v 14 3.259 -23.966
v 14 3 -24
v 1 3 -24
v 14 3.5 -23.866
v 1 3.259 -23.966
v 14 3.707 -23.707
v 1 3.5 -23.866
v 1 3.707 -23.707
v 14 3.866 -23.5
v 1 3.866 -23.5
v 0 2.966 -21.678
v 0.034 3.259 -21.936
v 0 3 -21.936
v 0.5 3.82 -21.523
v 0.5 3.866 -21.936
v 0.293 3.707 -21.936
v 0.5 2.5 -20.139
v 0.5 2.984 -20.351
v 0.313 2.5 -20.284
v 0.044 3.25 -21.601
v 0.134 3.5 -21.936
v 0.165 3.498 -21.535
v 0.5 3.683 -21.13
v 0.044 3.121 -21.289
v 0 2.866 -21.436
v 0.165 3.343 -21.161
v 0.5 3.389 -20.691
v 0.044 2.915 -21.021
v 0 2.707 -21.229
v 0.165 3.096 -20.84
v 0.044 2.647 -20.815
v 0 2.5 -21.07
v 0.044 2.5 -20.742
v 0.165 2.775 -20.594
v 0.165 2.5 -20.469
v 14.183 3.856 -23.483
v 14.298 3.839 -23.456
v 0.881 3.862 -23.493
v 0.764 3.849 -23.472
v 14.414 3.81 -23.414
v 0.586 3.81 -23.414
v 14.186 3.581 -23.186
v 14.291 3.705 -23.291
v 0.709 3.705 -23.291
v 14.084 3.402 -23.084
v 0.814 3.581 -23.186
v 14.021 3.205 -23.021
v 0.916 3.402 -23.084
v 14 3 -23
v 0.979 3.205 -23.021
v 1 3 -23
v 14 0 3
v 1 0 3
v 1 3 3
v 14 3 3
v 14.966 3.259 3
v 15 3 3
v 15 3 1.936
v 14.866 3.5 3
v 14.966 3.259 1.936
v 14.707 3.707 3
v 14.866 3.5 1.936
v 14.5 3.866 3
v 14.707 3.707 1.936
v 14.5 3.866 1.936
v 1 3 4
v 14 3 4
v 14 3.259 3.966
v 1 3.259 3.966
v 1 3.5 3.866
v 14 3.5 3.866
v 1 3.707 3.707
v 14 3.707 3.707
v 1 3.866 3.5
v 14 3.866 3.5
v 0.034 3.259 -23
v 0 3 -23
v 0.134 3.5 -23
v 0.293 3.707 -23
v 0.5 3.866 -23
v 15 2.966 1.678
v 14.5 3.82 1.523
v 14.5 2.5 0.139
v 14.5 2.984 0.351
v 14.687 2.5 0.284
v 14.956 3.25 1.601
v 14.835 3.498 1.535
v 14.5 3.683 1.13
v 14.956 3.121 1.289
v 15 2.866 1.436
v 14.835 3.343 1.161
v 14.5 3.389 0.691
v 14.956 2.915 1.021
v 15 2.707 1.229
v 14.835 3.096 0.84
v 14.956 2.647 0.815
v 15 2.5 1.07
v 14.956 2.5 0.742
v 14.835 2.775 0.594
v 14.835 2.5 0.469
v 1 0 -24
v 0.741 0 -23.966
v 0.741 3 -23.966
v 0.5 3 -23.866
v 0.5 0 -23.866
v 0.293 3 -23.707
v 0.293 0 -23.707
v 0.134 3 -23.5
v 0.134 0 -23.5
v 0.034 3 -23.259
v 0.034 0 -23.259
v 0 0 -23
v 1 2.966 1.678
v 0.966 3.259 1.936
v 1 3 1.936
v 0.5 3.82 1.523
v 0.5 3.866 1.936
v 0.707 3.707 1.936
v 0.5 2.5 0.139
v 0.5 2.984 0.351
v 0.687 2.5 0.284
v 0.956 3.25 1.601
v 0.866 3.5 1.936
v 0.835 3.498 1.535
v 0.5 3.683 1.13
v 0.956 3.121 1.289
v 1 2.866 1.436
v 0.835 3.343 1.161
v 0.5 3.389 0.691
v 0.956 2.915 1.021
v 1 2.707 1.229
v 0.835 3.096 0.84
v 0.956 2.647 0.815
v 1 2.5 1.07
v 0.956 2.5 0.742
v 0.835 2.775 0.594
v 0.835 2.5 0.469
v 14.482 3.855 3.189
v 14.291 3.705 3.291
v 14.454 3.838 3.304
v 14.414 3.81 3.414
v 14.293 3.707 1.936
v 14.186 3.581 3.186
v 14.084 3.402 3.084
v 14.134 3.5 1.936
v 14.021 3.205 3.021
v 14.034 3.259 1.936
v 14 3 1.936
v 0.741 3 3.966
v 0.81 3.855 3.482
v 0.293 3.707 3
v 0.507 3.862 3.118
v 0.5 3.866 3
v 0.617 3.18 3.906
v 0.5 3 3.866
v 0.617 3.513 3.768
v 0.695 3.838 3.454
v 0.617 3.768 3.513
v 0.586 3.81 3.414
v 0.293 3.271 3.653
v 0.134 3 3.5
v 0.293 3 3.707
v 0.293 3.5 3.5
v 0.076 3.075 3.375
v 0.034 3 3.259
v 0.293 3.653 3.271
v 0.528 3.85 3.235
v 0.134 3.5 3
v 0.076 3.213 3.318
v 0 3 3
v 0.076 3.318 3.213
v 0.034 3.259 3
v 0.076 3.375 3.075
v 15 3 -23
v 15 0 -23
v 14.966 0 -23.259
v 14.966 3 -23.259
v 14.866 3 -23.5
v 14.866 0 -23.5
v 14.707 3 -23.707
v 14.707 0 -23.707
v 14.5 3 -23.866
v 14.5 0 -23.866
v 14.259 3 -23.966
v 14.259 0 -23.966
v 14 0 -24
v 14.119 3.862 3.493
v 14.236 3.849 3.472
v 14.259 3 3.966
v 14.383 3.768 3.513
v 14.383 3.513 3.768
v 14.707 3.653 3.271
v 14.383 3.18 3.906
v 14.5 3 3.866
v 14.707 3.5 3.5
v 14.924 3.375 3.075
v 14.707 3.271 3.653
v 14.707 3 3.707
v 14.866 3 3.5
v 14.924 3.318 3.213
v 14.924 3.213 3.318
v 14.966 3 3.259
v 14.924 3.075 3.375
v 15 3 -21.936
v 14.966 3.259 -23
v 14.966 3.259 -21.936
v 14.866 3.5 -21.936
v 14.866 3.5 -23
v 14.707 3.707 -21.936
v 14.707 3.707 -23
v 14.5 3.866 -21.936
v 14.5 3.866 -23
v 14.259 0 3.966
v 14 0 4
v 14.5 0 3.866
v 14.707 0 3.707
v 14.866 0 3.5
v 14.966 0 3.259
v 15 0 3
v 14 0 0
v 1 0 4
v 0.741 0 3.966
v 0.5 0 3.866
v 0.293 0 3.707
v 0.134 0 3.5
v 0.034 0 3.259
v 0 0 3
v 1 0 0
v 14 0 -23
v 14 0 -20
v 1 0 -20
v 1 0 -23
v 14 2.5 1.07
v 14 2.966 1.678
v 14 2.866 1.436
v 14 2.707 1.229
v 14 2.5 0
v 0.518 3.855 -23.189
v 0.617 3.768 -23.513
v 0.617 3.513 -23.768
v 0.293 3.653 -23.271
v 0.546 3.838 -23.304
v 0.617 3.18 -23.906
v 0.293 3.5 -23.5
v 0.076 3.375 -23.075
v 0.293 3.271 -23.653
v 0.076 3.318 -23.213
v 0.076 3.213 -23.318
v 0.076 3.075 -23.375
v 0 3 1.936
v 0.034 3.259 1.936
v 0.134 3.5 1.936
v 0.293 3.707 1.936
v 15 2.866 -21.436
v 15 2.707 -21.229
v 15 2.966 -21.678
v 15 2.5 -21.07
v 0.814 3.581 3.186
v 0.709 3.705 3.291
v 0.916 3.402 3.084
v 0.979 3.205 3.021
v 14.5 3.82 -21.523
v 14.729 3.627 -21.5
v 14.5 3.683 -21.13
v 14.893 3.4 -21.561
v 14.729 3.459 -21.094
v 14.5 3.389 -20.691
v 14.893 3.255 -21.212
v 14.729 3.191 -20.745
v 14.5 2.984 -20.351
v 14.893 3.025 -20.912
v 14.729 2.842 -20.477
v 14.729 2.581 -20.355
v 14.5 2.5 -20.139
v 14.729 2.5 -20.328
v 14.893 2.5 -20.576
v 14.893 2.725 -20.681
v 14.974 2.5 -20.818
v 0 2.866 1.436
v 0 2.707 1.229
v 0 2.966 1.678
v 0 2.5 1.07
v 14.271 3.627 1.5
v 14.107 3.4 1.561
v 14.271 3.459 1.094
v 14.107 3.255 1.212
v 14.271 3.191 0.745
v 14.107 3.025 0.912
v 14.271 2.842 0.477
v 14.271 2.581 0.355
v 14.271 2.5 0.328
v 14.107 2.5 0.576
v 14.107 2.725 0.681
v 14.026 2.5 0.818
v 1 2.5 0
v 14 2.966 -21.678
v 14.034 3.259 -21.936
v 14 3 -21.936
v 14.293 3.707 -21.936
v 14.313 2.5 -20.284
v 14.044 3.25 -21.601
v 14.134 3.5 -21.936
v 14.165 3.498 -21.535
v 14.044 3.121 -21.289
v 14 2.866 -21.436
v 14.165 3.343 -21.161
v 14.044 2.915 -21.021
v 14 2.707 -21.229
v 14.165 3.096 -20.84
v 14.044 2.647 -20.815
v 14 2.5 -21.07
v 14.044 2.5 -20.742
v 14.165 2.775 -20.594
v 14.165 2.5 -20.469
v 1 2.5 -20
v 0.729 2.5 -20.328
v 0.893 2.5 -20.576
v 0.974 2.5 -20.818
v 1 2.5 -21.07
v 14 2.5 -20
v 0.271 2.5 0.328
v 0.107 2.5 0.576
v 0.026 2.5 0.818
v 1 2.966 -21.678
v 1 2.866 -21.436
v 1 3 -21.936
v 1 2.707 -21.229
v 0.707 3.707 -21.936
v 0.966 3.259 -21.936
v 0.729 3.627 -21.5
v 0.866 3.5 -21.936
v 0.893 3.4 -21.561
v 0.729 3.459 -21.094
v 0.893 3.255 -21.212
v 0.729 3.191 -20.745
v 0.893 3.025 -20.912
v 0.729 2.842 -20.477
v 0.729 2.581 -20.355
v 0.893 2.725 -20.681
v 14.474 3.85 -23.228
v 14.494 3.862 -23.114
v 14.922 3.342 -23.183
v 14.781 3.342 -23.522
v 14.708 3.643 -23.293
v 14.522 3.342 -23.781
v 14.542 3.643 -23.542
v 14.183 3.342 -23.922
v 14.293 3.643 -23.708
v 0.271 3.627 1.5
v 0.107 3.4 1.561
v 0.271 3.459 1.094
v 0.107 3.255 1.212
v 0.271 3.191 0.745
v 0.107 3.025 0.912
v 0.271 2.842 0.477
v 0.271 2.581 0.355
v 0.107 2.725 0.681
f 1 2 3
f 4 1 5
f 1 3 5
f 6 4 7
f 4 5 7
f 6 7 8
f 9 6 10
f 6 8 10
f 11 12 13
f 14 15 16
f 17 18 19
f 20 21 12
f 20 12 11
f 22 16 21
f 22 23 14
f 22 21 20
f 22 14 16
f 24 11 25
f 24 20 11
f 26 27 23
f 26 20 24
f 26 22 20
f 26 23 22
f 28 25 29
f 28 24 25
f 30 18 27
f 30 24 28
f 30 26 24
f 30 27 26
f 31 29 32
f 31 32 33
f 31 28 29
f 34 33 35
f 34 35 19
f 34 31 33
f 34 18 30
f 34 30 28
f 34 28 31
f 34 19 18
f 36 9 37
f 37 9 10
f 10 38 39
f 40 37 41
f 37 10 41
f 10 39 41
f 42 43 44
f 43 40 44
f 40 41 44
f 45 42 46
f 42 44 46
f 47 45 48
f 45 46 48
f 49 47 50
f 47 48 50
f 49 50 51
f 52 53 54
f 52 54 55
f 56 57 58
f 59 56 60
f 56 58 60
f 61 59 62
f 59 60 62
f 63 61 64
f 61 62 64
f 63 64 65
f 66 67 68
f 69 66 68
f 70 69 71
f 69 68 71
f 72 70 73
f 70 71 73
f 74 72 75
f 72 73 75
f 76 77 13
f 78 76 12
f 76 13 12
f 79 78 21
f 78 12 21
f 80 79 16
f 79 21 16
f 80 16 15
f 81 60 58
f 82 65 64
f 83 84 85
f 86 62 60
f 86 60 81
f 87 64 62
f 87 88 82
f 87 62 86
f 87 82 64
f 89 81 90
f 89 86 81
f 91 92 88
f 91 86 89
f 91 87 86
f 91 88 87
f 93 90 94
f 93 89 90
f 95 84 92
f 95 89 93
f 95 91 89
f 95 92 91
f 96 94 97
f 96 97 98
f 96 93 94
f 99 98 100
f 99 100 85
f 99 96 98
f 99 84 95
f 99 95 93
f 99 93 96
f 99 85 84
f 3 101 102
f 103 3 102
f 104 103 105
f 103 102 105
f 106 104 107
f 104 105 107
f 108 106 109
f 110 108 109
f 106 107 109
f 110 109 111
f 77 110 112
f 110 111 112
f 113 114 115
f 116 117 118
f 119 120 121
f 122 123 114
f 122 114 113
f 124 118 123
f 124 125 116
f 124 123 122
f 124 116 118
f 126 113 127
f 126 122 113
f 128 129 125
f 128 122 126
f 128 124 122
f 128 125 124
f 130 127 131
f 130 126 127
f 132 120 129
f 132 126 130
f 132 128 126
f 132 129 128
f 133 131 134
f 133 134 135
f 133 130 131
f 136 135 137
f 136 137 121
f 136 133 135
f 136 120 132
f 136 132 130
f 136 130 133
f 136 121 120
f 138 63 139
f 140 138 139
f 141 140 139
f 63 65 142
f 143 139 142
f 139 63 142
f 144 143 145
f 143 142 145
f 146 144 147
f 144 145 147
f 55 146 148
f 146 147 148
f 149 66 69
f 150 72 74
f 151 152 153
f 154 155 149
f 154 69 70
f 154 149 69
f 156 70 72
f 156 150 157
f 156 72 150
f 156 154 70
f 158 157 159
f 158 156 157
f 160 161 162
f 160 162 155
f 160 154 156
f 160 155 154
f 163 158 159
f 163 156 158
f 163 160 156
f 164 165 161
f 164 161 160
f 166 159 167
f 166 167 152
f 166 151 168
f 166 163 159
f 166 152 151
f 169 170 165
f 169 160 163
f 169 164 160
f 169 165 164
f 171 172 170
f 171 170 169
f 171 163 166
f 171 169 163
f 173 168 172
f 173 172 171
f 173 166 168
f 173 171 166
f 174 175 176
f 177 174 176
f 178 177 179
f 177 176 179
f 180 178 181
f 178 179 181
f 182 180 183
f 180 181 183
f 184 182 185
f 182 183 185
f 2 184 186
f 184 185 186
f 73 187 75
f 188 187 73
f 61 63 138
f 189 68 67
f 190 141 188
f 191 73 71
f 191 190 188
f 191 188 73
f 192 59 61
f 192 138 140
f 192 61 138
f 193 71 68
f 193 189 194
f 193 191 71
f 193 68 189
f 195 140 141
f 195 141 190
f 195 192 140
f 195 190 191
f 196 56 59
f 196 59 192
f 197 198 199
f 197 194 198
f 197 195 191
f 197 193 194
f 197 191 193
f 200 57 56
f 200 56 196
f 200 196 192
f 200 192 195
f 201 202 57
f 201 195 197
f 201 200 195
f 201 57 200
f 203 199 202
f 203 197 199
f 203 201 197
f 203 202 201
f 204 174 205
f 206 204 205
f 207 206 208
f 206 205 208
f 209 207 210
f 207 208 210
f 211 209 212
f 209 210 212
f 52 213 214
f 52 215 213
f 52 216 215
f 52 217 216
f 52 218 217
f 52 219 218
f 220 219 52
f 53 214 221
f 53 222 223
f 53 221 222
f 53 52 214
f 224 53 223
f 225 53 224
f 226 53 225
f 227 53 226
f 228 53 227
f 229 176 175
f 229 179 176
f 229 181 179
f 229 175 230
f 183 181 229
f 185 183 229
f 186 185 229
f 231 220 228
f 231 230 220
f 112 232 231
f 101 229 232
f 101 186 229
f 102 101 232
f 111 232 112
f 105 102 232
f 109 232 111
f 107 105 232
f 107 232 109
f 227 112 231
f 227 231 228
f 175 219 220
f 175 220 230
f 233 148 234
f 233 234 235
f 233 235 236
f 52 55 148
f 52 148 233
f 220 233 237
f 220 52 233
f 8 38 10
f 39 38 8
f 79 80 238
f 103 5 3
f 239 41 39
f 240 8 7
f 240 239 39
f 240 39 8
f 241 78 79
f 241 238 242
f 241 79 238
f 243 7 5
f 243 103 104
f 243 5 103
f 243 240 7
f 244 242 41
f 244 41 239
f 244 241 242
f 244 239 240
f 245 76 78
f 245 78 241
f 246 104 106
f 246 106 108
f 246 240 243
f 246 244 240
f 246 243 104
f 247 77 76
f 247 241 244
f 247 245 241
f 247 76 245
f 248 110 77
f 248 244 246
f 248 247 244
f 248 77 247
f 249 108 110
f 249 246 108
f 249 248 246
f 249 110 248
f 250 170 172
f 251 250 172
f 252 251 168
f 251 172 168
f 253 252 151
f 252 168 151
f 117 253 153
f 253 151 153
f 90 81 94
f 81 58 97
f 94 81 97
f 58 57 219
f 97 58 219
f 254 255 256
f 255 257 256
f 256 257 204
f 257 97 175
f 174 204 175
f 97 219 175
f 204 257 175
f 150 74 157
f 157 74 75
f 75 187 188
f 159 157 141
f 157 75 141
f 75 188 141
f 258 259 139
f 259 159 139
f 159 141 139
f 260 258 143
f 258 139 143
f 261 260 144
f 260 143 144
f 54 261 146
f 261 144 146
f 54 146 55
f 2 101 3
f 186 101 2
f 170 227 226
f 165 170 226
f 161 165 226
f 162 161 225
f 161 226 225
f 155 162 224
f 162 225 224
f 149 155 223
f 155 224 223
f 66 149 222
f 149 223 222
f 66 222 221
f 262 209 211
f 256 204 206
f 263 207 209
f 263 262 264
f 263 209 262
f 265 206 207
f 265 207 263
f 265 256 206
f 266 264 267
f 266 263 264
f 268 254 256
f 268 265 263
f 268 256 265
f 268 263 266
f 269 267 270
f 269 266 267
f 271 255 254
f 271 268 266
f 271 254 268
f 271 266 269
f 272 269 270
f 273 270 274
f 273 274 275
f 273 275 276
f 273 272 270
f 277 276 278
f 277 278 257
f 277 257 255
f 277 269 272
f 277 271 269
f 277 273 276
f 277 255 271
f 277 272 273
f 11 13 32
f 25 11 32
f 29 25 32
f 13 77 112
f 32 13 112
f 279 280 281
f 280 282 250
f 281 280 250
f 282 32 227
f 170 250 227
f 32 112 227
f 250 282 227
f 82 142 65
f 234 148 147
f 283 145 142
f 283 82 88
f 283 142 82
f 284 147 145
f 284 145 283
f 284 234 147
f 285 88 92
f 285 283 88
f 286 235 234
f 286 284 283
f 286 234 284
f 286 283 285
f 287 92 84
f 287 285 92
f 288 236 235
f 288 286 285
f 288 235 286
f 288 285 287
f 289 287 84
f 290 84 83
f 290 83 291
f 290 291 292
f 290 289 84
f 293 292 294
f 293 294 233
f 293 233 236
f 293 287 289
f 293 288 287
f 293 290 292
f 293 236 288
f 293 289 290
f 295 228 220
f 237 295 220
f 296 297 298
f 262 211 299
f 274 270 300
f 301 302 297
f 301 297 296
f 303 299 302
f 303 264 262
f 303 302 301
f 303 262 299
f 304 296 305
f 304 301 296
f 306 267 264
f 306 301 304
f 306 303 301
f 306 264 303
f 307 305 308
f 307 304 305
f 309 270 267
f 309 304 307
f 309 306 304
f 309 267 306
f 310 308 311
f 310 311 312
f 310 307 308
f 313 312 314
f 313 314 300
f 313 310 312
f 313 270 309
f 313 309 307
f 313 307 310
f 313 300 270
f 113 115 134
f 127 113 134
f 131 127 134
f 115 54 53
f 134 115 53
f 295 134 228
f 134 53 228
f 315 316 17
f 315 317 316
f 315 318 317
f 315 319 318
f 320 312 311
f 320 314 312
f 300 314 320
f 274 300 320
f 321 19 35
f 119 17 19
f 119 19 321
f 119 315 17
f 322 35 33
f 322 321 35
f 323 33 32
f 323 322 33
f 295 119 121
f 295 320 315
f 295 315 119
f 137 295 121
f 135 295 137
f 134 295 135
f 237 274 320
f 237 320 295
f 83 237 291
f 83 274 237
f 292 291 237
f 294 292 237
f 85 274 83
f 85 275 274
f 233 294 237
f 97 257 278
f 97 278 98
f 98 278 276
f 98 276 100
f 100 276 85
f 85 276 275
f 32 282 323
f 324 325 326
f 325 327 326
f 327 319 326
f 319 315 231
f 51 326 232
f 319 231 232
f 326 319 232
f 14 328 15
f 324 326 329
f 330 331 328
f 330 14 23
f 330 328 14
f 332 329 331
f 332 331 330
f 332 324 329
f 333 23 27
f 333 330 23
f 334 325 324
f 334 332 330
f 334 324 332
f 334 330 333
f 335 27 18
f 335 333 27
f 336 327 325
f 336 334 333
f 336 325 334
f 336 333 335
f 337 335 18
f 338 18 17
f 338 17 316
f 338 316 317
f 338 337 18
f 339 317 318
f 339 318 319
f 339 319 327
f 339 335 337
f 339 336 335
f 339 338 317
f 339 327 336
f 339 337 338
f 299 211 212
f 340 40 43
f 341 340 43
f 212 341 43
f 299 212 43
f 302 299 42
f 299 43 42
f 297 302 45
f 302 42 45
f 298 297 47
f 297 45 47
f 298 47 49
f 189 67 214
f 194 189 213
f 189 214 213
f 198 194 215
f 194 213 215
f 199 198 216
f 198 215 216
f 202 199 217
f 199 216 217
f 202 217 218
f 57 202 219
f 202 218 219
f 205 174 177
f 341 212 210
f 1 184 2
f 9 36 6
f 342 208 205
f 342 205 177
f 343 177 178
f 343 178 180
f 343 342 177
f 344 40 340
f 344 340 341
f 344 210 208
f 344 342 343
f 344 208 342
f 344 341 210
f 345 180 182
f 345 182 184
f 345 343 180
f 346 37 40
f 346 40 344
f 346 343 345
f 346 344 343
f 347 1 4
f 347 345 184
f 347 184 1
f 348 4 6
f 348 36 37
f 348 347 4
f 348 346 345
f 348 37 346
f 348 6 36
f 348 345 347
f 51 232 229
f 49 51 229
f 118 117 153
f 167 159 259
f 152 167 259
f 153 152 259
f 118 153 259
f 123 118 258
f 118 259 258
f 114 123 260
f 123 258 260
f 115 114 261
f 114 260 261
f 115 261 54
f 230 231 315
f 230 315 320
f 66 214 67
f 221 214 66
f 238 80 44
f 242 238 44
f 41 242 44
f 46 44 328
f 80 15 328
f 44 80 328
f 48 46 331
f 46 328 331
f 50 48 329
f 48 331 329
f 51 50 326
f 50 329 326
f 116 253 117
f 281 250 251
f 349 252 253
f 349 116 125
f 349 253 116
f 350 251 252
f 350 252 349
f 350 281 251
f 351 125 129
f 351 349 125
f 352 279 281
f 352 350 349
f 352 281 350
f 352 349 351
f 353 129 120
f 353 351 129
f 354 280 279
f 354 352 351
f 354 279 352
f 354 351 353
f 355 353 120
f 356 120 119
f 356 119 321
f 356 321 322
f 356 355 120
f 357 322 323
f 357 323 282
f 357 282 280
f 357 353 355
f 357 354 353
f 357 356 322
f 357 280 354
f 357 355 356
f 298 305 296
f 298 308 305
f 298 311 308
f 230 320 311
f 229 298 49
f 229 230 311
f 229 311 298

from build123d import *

# Parameters (mm, degrees)
SKETCH1_W           = 13
SKETCH1_H           = 3
BOSS_EXTRUDE1_DEPTH = 4
SKETCH2_W           = 15
SKETCH2_H           = 20
CUT_EXTRUDE1_DEPTH  = 1.5
FILLET1_R           = 2
FILLET2_R           = 1


with BuildPart() as part:
    # Sketch1 → Boss-Extrude1 (new body)
    with BuildSketch(Plane(origin=(0, 0, 0), x_dir=(1, 0, 0), z_dir=(0, 1, 0))):
        Polygon((0, 0), (0, 20), (0, 24), (15, 24), (15, 20), (15, 0), (15, -4), (0, -4), align=None)
        with Locations((7.5, 21.5)):
            Rectangle(SKETCH1_W, SKETCH1_H, mode=Mode.SUBTRACT)
        with Locations((7.5, -1.5)):
            Rectangle(SKETCH1_W, SKETCH1_H, mode=Mode.SUBTRACT)
    extrude(amount=BOSS_EXTRUDE1_DEPTH)

    # Sketch2 → Cut-Extrude1 (cut)
    with BuildSketch(Plane(origin=(0, 4, 0), x_dir=(1, 0, 0), z_dir=(0, 1, 0))):
        with Locations((7.5, 10)):
            Rectangle(SKETCH2_W, SKETCH2_H)
    extrude(amount=-CUT_EXTRUDE1_DEPTH, mode=Mode.SUBTRACT)

    # Fillet1
    # the kernel refuses this fillet: 2 mm, written as the material it takes off along each edge
    with BuildSketch(Plane(origin=(-4.841229183, 4, 0), x_dir=(0, -1, 0), z_dir=(1, 0, 0))) as fillet1_piece_1:
        with BuildLine():
            CenterArc((2, -1.936491673), FILLET1_R, 104.477512186, 75.522487814)
            Line((0, -1.936491673), (-0.04, -1.936491673))
            Line((-0.04, -1.936491673), (-0.04, 0))
            Line((-0.04, 0), (0, 0.04))
            ThreePointArc((0, 0.04), (0.75, 0.04), (1.49, 0.038729833))
            Line((1.49, 0.038729833), (1.5, 0))
        make_face()
    extrude(amount=10.682458366, mode=Mode.SUBTRACT)
    with BuildSketch(Plane(origin=(9.158770817, 4, 0), x_dir=(0, 0, 1), z_dir=(1, 0, 0)), Plane(origin=(19.841229183, 4, -20), x_dir=(0, 0, -1), z_dir=(-1, 0, 0)), Plane(origin=(5.841229183, 4, -20), x_dir=(0, 0, -1), z_dir=(-1, 0, 0))) as fillet1_piece_2:
        with BuildLine():
            CenterArc((1.936491673, 2), FILLET1_R, 194.477512186, 75.522487814)
            Line((0, 1.5), (-0.038729833, 1.49))
            ThreePointArc((-0.038729833, 1.49), (-0.04, 0.75), (-0.04, 0))
            Line((-0.04, 0), (0, -0.04))
            Line((0, -0.04), (1.936491673, -0.04))
            Line((1.936491673, -0.04), (1.936491673, 0))
        make_face()
    extrude(amount=10.682458366, mode=Mode.SUBTRACT)

    # Fillet2
    # the kernel refuses this fillet: 1 mm, written as the material it takes off along each edge
    with BuildSketch(Plane(origin=(14, 3, 3), x_dir=(0, 0, 1), z_dir=(1, 0, 0))) as fillet2_piece_1_section:
        Polygon((0, 0), (FILLET2_R * 1.02, 0), (FILLET2_R * 1.02, -FILLET2_R * 1.02), (0, -FILLET2_R * 1.02), align=None)
    fillet2_piece_1 = extrude(amount=FILLET2_R * 1.02, mode=Mode.PRIVATE)
    fillet2_piece_1 = fillet2_piece_1 - Plane(origin=(14, 3, 3), x_dir=(0, -0.7071067811865475, -0.7071067811865475), z_dir=(1, 0, 0)) * Sphere(FILLET2_R, mode=Mode.PRIVATE)
    add(fillet2_piece_1, mode=Mode.SUBTRACT)
    with BuildSketch(Plane(origin=(1, 3, 3), x_dir=(0, 0, 1), z_dir=(-1, 0, 0))) as fillet2_piece_2_section:
        Polygon((0, 0), (FILLET2_R * 1.02, 0), (FILLET2_R * 1.02, FILLET2_R * 1.02), (0, FILLET2_R * 1.02), align=None)
    fillet2_piece_2 = extrude(amount=FILLET2_R * 1.02, mode=Mode.PRIVATE)
    fillet2_piece_2 = fillet2_piece_2 - Plane(origin=(1, 3, 3), x_dir=(0, -0.7071067811865475, -0.7071067811865475), z_dir=(-1, 0, 0)) * Sphere(FILLET2_R, mode=Mode.PRIVATE)
    add(fillet2_piece_2, mode=Mode.SUBTRACT)
    with BuildSketch(Plane(origin=(1, 3, -23), x_dir=(0, 1, 0), z_dir=(-1, 0, 0))) as fillet2_piece_3_section:
        Polygon((0, 0), (FILLET2_R * 1.02, 0), (FILLET2_R * 1.02, FILLET2_R * 1.02), (0, FILLET2_R * 1.02), align=None)
    fillet2_piece_3 = extrude(amount=FILLET2_R * 1.02, mode=Mode.PRIVATE)
    fillet2_piece_3 = fillet2_piece_3 - Plane(origin=(1, 3, -23), x_dir=(0, -0.7071067811865475, 0.7071067811865475), z_dir=(-1, 0, 0)) * Sphere(FILLET2_R, mode=Mode.PRIVATE)
    add(fillet2_piece_3, mode=Mode.SUBTRACT)
    with BuildSketch(Plane(origin=(14, 3, -23), x_dir=(0, 0, -1), z_dir=(0, 1, 0))) as fillet2_piece_4_section:
        Polygon((0, 0), (FILLET2_R * 1.02, 0), (FILLET2_R * 1.02, -FILLET2_R * 1.02), (0, -FILLET2_R * 1.02), align=None)
    fillet2_piece_4 = extrude(amount=FILLET2_R * 1.02, mode=Mode.PRIVATE)
    fillet2_piece_4 = fillet2_piece_4 - Plane(origin=(14, 3, -23), x_dir=(-0.7071067811865475, 0, 0.7071067811865475), z_dir=(0, 1, 0)) * Sphere(FILLET2_R, mode=Mode.PRIVATE)
    add(fillet2_piece_4, mode=Mode.SUBTRACT)
    with BuildSketch(Plane(origin=(14, 2, 1.936491673), x_dir=(0, 1, 0), z_dir=(0, 0, 1))) as fillet2_piece_5_section:
        with BuildLine():
            CenterArc((2 - FILLET2_R, -FILLET2_R), FILLET2_R, 0, 90)
            Line((2, -FILLET2_R), (2 + FILLET2_R * 0.02, -FILLET2_R))
            Line((2 + FILLET2_R * 0.02, -FILLET2_R), (2 + FILLET2_R * 0.02, FILLET2_R * 0.02))
            Line((2 + FILLET2_R * 0.02, FILLET2_R * 0.02), (2 - FILLET2_R, FILLET2_R * 0.02))
            Line((2 - FILLET2_R, FILLET2_R * 0.02), (2 - FILLET2_R, 0))
        make_face()
    fillet2_piece_5 = revolve(axis=Axis((14, 2, 1.936491673), (-1, 0, 0)), revolution_arc=147.162469187, mode=Mode.PRIVATE)
    fillet2_piece_5 = split(fillet2_piece_5, bisect_by=Plane(origin=(14.245105453, 3.345971108, 0), z_dir=(0, 0, 1)), keep=Keep.TOP, mode=Mode.PRIVATE)
    fillet2_piece_5 = split(fillet2_piece_5, bisect_by=Plane(origin=(14.245105453, 2.5, 0.926068322), z_dir=(0, 1, 0)), keep=Keep.TOP, mode=Mode.PRIVATE)
    add(fillet2_piece_5, mode=Mode.SUBTRACT)
    with BuildSketch(Plane(origin=(15, 2, 1.936491673), x_dir=(0, 1, 0), z_dir=(0, 0, 1))) as fillet2_piece_6_section:
        with BuildLine():
            CenterArc((2 - FILLET2_R, FILLET2_R), FILLET2_R, 270, 90)
            Line((2 - FILLET2_R, 0), (2 - FILLET2_R, -FILLET2_R * 0.02))
            Line((2 - FILLET2_R, -FILLET2_R * 0.02), (2 + FILLET2_R * 0.02, -FILLET2_R * 0.02))
            Line((2 + FILLET2_R * 0.02, -FILLET2_R * 0.02), (2 + FILLET2_R * 0.02, FILLET2_R))
            Line((2 + FILLET2_R * 0.02, FILLET2_R), (2, FILLET2_R))
        make_face()
    fillet2_piece_6 = revolve(axis=Axis((15, 2, 1.936491673), (-1, 0, 0)), revolution_arc=147.162469187, mode=Mode.PRIVATE)
    fillet2_piece_6 = split(fillet2_piece_6, bisect_by=Plane(origin=(14.754554239, 2.5, 0.924771773), z_dir=(0, 1, 0)), keep=Keep.TOP, mode=Mode.PRIVATE)
    add(fillet2_piece_6, mode=Mode.SUBTRACT)
    with BuildSketch(Plane(origin=(0, 2, 1.936491673), x_dir=(0, 1, 0), z_dir=(0, 0, 1))) as fillet2_piece_7_section:
        with BuildLine():
            CenterArc((2 - FILLET2_R, -FILLET2_R), FILLET2_R, 0, 90)
            Line((2, -FILLET2_R), (2 + FILLET2_R * 0.02, -FILLET2_R))
            Line((2 + FILLET2_R * 0.02, -FILLET2_R), (2 + FILLET2_R * 0.02, FILLET2_R * 0.02))
            Line((2 + FILLET2_R * 0.02, FILLET2_R * 0.02), (2 - FILLET2_R, FILLET2_R * 0.02))
            Line((2 - FILLET2_R, FILLET2_R * 0.02), (2 - FILLET2_R, 0))
        make_face()
    fillet2_piece_7 = revolve(axis=Axis((0, 2, 1.936491673), (-1, 0, 0)), revolution_arc=147.162469187, mode=Mode.PRIVATE)
    fillet2_piece_7 = split(fillet2_piece_7, bisect_by=Plane(origin=(0.245445759, 2.5, 0.924771781), z_dir=(0, 1, 0)), keep=Keep.TOP, mode=Mode.PRIVATE)
    add(fillet2_piece_7, mode=Mode.SUBTRACT)
    with BuildSketch(Plane(origin=(1, 2, 1.936491673), x_dir=(0, 1, 0), z_dir=(0, 0, 1))) as fillet2_piece_8_section:
        with BuildLine():
            CenterArc((2 - FILLET2_R, FILLET2_R), FILLET2_R, 270, 90)
            Line((2, FILLET2_R), (2 + FILLET2_R * 0.02, FILLET2_R))
            Line((2 + FILLET2_R * 0.02, FILLET2_R), (2 + FILLET2_R * 0.02, -FILLET2_R * 0.02))
            Line((2 + FILLET2_R * 0.02, -FILLET2_R * 0.02), (2 - FILLET2_R, -FILLET2_R * 0.02))
            Line((2 - FILLET2_R, -FILLET2_R * 0.02), (2 - FILLET2_R, 0))
        make_face()
    fillet2_piece_8 = revolve(axis=Axis((1, 2, 1.936491673), (-1, 0, 0)), revolution_arc=147.162469187, mode=Mode.PRIVATE)
    fillet2_piece_8 = split(fillet2_piece_8, bisect_by=Plane(origin=(0.754894544, 3.345971097, 0), z_dir=(0, 0, 1)), keep=Keep.TOP, mode=Mode.PRIVATE)
    fillet2_piece_8 = split(fillet2_piece_8, bisect_by=Plane(origin=(0.754894544, 2.5, 0.926068314), z_dir=(0, 1, 0)), keep=Keep.TOP, mode=Mode.PRIVATE)
    add(fillet2_piece_8, mode=Mode.SUBTRACT)
    with BuildSketch(Plane(origin=(1, 2, -21.936491673), x_dir=(0, 1, 0), z_dir=(0, 0, -1))) as fillet2_piece_9_section:
        with BuildLine():
            CenterArc((2 - FILLET2_R, -FILLET2_R), FILLET2_R, 0, 90)
            Line((2, -FILLET2_R), (2 + FILLET2_R * 0.02, -FILLET2_R))
            Line((2 + FILLET2_R * 0.02, -FILLET2_R), (2 + FILLET2_R * 0.02, FILLET2_R * 0.02))
            Line((2 + FILLET2_R * 0.02, FILLET2_R * 0.02), (2 - FILLET2_R, FILLET2_R * 0.02))
            Line((2 - FILLET2_R, FILLET2_R * 0.02), (2 - FILLET2_R, 0))
        make_face()
    fillet2_piece_9 = revolve(axis=Axis((1, 2, -21.936491673), (1, 0, 0)), revolution_arc=147.162469187, mode=Mode.PRIVATE)
    fillet2_piece_9 = split(fillet2_piece_9, bisect_by=Plane(origin=(0.754894544, 3.345971097, -20), z_dir=(0, 0, -1)), keep=Keep.TOP, mode=Mode.PRIVATE)
    fillet2_piece_9 = split(fillet2_piece_9, bisect_by=Plane(origin=(0.754894544, 2.5, -20.926068314), z_dir=(0, 1, 0)), keep=Keep.TOP, mode=Mode.PRIVATE)
    add(fillet2_piece_9, mode=Mode.SUBTRACT)
    with BuildSketch(Plane(origin=(0, 2, -21.936491673), x_dir=(0, 1, 0), z_dir=(0, 0, -1))) as fillet2_piece_10_section:
        with BuildLine():
            CenterArc((2 - FILLET2_R, FILLET2_R), FILLET2_R, 270, 90)
            Line((2, FILLET2_R), (2 + FILLET2_R * 0.02, FILLET2_R))
            Line((2 + FILLET2_R * 0.02, FILLET2_R), (2 + FILLET2_R * 0.02, -FILLET2_R * 0.02))
            Line((2 + FILLET2_R * 0.02, -FILLET2_R * 0.02), (2 - FILLET2_R, -FILLET2_R * 0.02))
            Line((2 - FILLET2_R, -FILLET2_R * 0.02), (2 - FILLET2_R, 0))
        make_face()
    fillet2_piece_10 = revolve(axis=Axis((0, 2, -21.936491673), (1, 0, 0)), revolution_arc=147.162469187, mode=Mode.PRIVATE)
    fillet2_piece_10 = split(fillet2_piece_10, bisect_by=Plane(origin=(0.245445759, 2.5, -20.924771781), z_dir=(0, 1, 0)), keep=Keep.TOP, mode=Mode.PRIVATE)
    add(fillet2_piece_10, mode=Mode.SUBTRACT)
    with BuildSketch(Plane(origin=(15, 2, -21.936491673), x_dir=(0, 1, 0), z_dir=(0, 0, -1))) as fillet2_piece_11_section:
        with BuildLine():
            CenterArc((2 - FILLET2_R, -FILLET2_R), FILLET2_R, 0, 90)
            Line((2 - FILLET2_R, 0), (2 - FILLET2_R, FILLET2_R * 0.02))
            Line((2 - FILLET2_R, FILLET2_R * 0.02), (2 + FILLET2_R * 0.02, FILLET2_R * 0.02))
            Line((2 + FILLET2_R * 0.02, FILLET2_R * 0.02), (2 + FILLET2_R * 0.02, -FILLET2_R))
            Line((2 + FILLET2_R * 0.02, -FILLET2_R), (2, -FILLET2_R))
        make_face()
    fillet2_piece_11 = revolve(axis=Axis((15, 2, -21.936491673), (1, 0, 0)), revolution_arc=147.162469187, mode=Mode.PRIVATE)
    fillet2_piece_11 = split(fillet2_piece_11, bisect_by=Plane(origin=(14.754554239, 2.5, -20.924771773), z_dir=(0, 1, 0)), keep=Keep.TOP, mode=Mode.PRIVATE)
    add(fillet2_piece_11, mode=Mode.SUBTRACT)
    with BuildSketch(Plane(origin=(14, 2, -21.936491673), x_dir=(0, 1, 0), z_dir=(0, 0, -1))) as fillet2_piece_12_section:
        with BuildLine():
            CenterArc((2 - FILLET2_R, FILLET2_R), FILLET2_R, 270, 90)
            Line((2, FILLET2_R), (2 + FILLET2_R * 0.02, FILLET2_R))
            Line((2 + FILLET2_R * 0.02, FILLET2_R), (2 + FILLET2_R * 0.02, -FILLET2_R * 0.02))
            Line((2 + FILLET2_R * 0.02, -FILLET2_R * 0.02), (2 - FILLET2_R, -FILLET2_R * 0.02))
            Line((2 - FILLET2_R, -FILLET2_R * 0.02), (2 - FILLET2_R, 0))
        make_face()
    fillet2_piece_12 = revolve(axis=Axis((14, 2, -21.936491673), (1, 0, 0)), revolution_arc=147.162469187, mode=Mode.PRIVATE)
    fillet2_piece_12 = split(fillet2_piece_12, bisect_by=Plane(origin=(14.245105453, 3.345971108, -20), z_dir=(0, 0, -1)), keep=Keep.TOP, mode=Mode.PRIVATE)
    fillet2_piece_12 = split(fillet2_piece_12, bisect_by=Plane(origin=(14.245105453, 2.5, -20.926068322), z_dir=(0, 1, 0)), keep=Keep.TOP, mode=Mode.PRIVATE)
    add(fillet2_piece_12, mode=Mode.SUBTRACT)
    with BuildSketch(Plane(origin=(14, 4, 3), x_dir=(0, -1, 0), z_dir=(-1, 0, 0)), Plane(origin=(1, 4, -23), x_dir=(0, -1, 0), z_dir=(1, 0, 0)), Plane(origin=(1, 4, -24), x_dir=(0, 0, 1), z_dir=(1, 0, 0))) as fillet2_piece_13:
        with BuildLine():
            CenterArc((FILLET2_R, FILLET2_R), FILLET2_R, 180, 90)
            Line((0, FILLET2_R), (-FILLET2_R * 0.02, FILLET2_R))
            Line((-FILLET2_R * 0.02, FILLET2_R), (-FILLET2_R * 0.02, -FILLET2_R * 0.02))
            Line((-FILLET2_R * 0.02, -FILLET2_R * 0.02), (FILLET2_R, -FILLET2_R * 0.02))
            Line((FILLET2_R, -FILLET2_R * 0.02), (FILLET2_R, 0))
        make_face()
    extrude(amount=13, mode=Mode.SUBTRACT)
    with BuildSketch(Plane(origin=(14, 4, 1.936491673), x_dir=(0, -1, 0), z_dir=(0, 0, 1)), Plane(origin=(1, 4, 3), x_dir=(0, -1, 0), z_dir=(0, 0, -1)), Plane(origin=(1, 4, -21.936491673), x_dir=(0, -1, 0), z_dir=(0, 0, -1)), Plane(origin=(14, 4, -23), x_dir=(0, -1, 0), z_dir=(0, 0, 1))) as fillet2_piece_14:
        with BuildLine():
            CenterArc((FILLET2_R, FILLET2_R), FILLET2_R, 180, 90)
            Line((0, FILLET2_R), (-FILLET2_R * 0.02, FILLET2_R))
            Line((-FILLET2_R * 0.02, FILLET2_R), (-FILLET2_R * 0.02, -FILLET2_R * 0.02))
            Line((-FILLET2_R * 0.02, -FILLET2_R * 0.02), (FILLET2_R, -FILLET2_R * 0.02))
            Line((FILLET2_R, -FILLET2_R * 0.02), (FILLET2_R, 0))
        make_face()
    extrude(amount=1.063508327, mode=Mode.SUBTRACT)
    with BuildSketch(Plane(origin=(15, 4, 1.936491673), x_dir=(0, -1, 0), z_dir=(0, 0, 1)), Plane(origin=(0, 4, 3), x_dir=(0, -1, 0), z_dir=(0, 0, -1)), Plane(origin=(0, 4, -21.936491673), x_dir=(0, -1, 0), z_dir=(0, 0, -1)), Plane(origin=(15, 4, -23), x_dir=(0, -1, 0), z_dir=(0, 0, 1))) as fillet2_piece_15:
        with BuildLine():
            CenterArc((FILLET2_R, -FILLET2_R), FILLET2_R, 90, 90)
            Line((0, -FILLET2_R), (-FILLET2_R * 0.02, -FILLET2_R))
            Line((-FILLET2_R * 0.02, -FILLET2_R), (-FILLET2_R * 0.02, FILLET2_R * 0.02))
            Line((-FILLET2_R * 0.02, FILLET2_R * 0.02), (FILLET2_R, FILLET2_R * 0.02))
            Line((FILLET2_R, FILLET2_R * 0.02), (FILLET2_R, 0))
        make_face()
    extrude(amount=1.063508327, mode=Mode.SUBTRACT)
    with BuildSketch(Plane(origin=(14, 4, 4), x_dir=(0, -1, 0), z_dir=(-1, 0, 0))) as fillet2_piece_16:
        with BuildLine():
            CenterArc((FILLET2_R, -FILLET2_R), FILLET2_R, 90, 90)
            Line((0, -FILLET2_R), (-FILLET2_R * 0.02, -FILLET2_R))
            Line((-FILLET2_R * 0.02, -FILLET2_R), (-FILLET2_R * 0.02, FILLET2_R * 0.02))
            Line((-FILLET2_R * 0.02, FILLET2_R * 0.02), (FILLET2_R, FILLET2_R * 0.02))
            Line((FILLET2_R, FILLET2_R * 0.02), (FILLET2_R, 0))
        make_face()
    extrude(amount=13, mode=Mode.SUBTRACT)
    with BuildSketch(Plane(origin=(0, 0, -24), x_dir=(0, 0, 1), z_dir=(0, 1, 0)), Plane(origin=(15, 0, 4), x_dir=(0, 0, -1), z_dir=(0, 1, 0))) as fillet2_piece_17:
        with BuildLine():
            CenterArc((FILLET2_R, FILLET2_R), FILLET2_R, 180, 90)
            Line((0, FILLET2_R), (-FILLET2_R * 0.02, FILLET2_R))
            Line((-FILLET2_R * 0.02, FILLET2_R), (-FILLET2_R * 0.02, -FILLET2_R * 0.02))
            Line((-FILLET2_R * 0.02, -FILLET2_R * 0.02), (FILLET2_R, -FILLET2_R * 0.02))
            Line((FILLET2_R, -FILLET2_R * 0.02), (FILLET2_R, 0))
        make_face()
    extrude(amount=3, mode=Mode.SUBTRACT)
    with BuildSketch(Plane(origin=(15, 0, -24), x_dir=(0, 0, 1), z_dir=(0, 1, 0)), Plane(origin=(0, 0, 4), x_dir=(0, 0, -1), z_dir=(0, 1, 0))) as fillet2_piece_18:
        with BuildLine():
            CenterArc((FILLET2_R, -FILLET2_R), FILLET2_R, 90, 90)
            Line((0, -FILLET2_R), (-FILLET2_R * 0.02, -FILLET2_R))
            Line((-FILLET2_R * 0.02, -FILLET2_R), (-FILLET2_R * 0.02, FILLET2_R * 0.02))
            Line((-FILLET2_R * 0.02, FILLET2_R * 0.02), (FILLET2_R, FILLET2_R * 0.02))
            Line((FILLET2_R, FILLET2_R * 0.02), (FILLET2_R, 0))
        make_face()
    extrude(amount=3, mode=Mode.SUBTRACT)
    with BuildSketch(Plane(origin=(14, 4, 1.936491673), x_dir=(0, -1, 0), z_dir=(0, 0, 1))) as fillet2_piece_19a_section:
        with BuildLine():
            CenterArc((FILLET2_R, FILLET2_R), FILLET2_R, 180, 90)
            Line((0, FILLET2_R), (-FILLET2_R * 0.02, FILLET2_R))
            Line((-FILLET2_R * 0.02, FILLET2_R), (-FILLET2_R * 0.02, -FILLET2_R * 0.02))
            Line((-FILLET2_R * 0.02, -FILLET2_R * 0.02), (FILLET2_R, -FILLET2_R * 0.02))
            Line((FILLET2_R, -FILLET2_R * 0.02), (FILLET2_R, 0))
        make_face()
    fillet2_piece_19a = extrude(amount=3.563508327, mode=Mode.PRIVATE)
    fillet2_piece_19a = split(fillet2_piece_19a, bisect_by=Plane(origin=(14.226395114, 3.773604886, 3), z_dir=(0, 0, 1)), keep=Keep.TOP, mode=Mode.PRIVATE)
    with BuildSketch(Plane(origin=(16.5, 4, 3), x_dir=(0, -1, 0), z_dir=(-1, 0, 0))) as fillet2_piece_19b_section:
        with BuildLine():
            CenterArc((FILLET2_R, FILLET2_R), FILLET2_R, 180, 90)
            Line((0, FILLET2_R), (-FILLET2_R * 0.02, FILLET2_R))
            Line((-FILLET2_R * 0.02, FILLET2_R), (-FILLET2_R * 0.02, -FILLET2_R * 0.02))
            Line((-FILLET2_R * 0.02, -FILLET2_R * 0.02), (FILLET2_R, -FILLET2_R * 0.02))
            Line((FILLET2_R, -FILLET2_R * 0.02), (FILLET2_R, 0))
        make_face()
    fillet2_piece_19b = extrude(amount=15.5, mode=Mode.PRIVATE)
    fillet2_piece_19b = split(fillet2_piece_19b, bisect_by=Plane(origin=(14, 3.773604886, 3.226395114), z_dir=(1, 0, 0)), keep=Keep.TOP, mode=Mode.PRIVATE)
    fillet2_piece_19 = fillet2_piece_19a & fillet2_piece_19b
    add(fillet2_piece_19, mode=Mode.SUBTRACT)
    with BuildSketch(Plane(origin=(14, 4, 3), x_dir=(0, -1, 0), z_dir=(-1, 0, 0))) as fillet2_piece_20a_section:
        with BuildLine():
            CenterArc((FILLET2_R, FILLET2_R), FILLET2_R, 180, 90)
            Line((0, FILLET2_R), (-FILLET2_R * 0.02, FILLET2_R))
            Line((-FILLET2_R * 0.02, FILLET2_R), (-FILLET2_R * 0.02, -FILLET2_R * 0.02))
            Line((-FILLET2_R * 0.02, -FILLET2_R * 0.02), (FILLET2_R, -FILLET2_R * 0.02))
            Line((FILLET2_R, -FILLET2_R * 0.02), (FILLET2_R, 0))
        make_face()
    fillet2_piece_20a = extrude(amount=15.5, mode=Mode.PRIVATE)
    fillet2_piece_20a = split(fillet2_piece_20a, bisect_by=Plane(origin=(1, 3.773604886, 3.226395114), z_dir=(-1, 0, 0)), keep=Keep.TOP, mode=Mode.PRIVATE)
    with BuildSketch(Plane(origin=(1, 4, 5.5), x_dir=(0, -1, 0), z_dir=(0, 0, -1))) as fillet2_piece_20b_section:
        with BuildLine():
            CenterArc((FILLET2_R, FILLET2_R), FILLET2_R, 180, 90)
            Line((0, FILLET2_R), (-FILLET2_R * 0.02, FILLET2_R))
            Line((-FILLET2_R * 0.02, FILLET2_R), (-FILLET2_R * 0.02, -FILLET2_R * 0.02))
            Line((-FILLET2_R * 0.02, -FILLET2_R * 0.02), (FILLET2_R, -FILLET2_R * 0.02))
            Line((FILLET2_R, -FILLET2_R * 0.02), (FILLET2_R, 0))
        make_face()
    fillet2_piece_20b = extrude(amount=3.563508327, mode=Mode.PRIVATE)
    fillet2_piece_20b = split(fillet2_piece_20b, bisect_by=Plane(origin=(0.773604886, 3.773604886, 3), z_dir=(0, 0, 1)), keep=Keep.TOP, mode=Mode.PRIVATE)
    fillet2_piece_20 = fillet2_piece_20a & fillet2_piece_20b
    add(fillet2_piece_20, mode=Mode.SUBTRACT)
    with BuildSketch(Plane(origin=(1, 4, -21.936491673), x_dir=(0, -1, 0), z_dir=(0, 0, -1))) as fillet2_piece_21a_section:
        with BuildLine():
            CenterArc((FILLET2_R, FILLET2_R), FILLET2_R, 180, 90)
            Line((0, FILLET2_R), (-FILLET2_R * 0.02, FILLET2_R))
            Line((-FILLET2_R * 0.02, FILLET2_R), (-FILLET2_R * 0.02, -FILLET2_R * 0.02))
            Line((-FILLET2_R * 0.02, -FILLET2_R * 0.02), (FILLET2_R, -FILLET2_R * 0.02))
            Line((FILLET2_R, -FILLET2_R * 0.02), (FILLET2_R, 0))
        make_face()
    fillet2_piece_21a = extrude(amount=3.563508327, mode=Mode.PRIVATE)
    fillet2_piece_21a = split(fillet2_piece_21a, bisect_by=Plane(origin=(0.773604886, 3.773604886, -23), z_dir=(0, 0, -1)), keep=Keep.TOP, mode=Mode.PRIVATE)
    with BuildSketch(Plane(origin=(-1.5, 4, -23), x_dir=(0, -1, 0), z_dir=(1, 0, 0))) as fillet2_piece_21b_section:
        with BuildLine():
            CenterArc((FILLET2_R, FILLET2_R), FILLET2_R, 180, 90)
            Line((0, FILLET2_R), (-FILLET2_R * 0.02, FILLET2_R))
            Line((-FILLET2_R * 0.02, FILLET2_R), (-FILLET2_R * 0.02, -FILLET2_R * 0.02))
            Line((-FILLET2_R * 0.02, -FILLET2_R * 0.02), (FILLET2_R, -FILLET2_R * 0.02))
            Line((FILLET2_R, -FILLET2_R * 0.02), (FILLET2_R, 0))
        make_face()
    fillet2_piece_21b = extrude(amount=15.5, mode=Mode.PRIVATE)
    fillet2_piece_21b = split(fillet2_piece_21b, bisect_by=Plane(origin=(1, 3.773604886, -23.226395114), z_dir=(-1, 0, 0)), keep=Keep.TOP, mode=Mode.PRIVATE)
    fillet2_piece_21 = fillet2_piece_21a & fillet2_piece_21b
    add(fillet2_piece_21, mode=Mode.SUBTRACT)
    with BuildSketch(Plane(origin=(1, 4, -23), x_dir=(0, -1, 0), z_dir=(1, 0, 0))) as fillet2_piece_22a_section:
        with BuildLine():
            CenterArc((FILLET2_R, FILLET2_R), FILLET2_R, 180, 90)
            Line((0, FILLET2_R), (-FILLET2_R * 0.02, FILLET2_R))
            Line((-FILLET2_R * 0.02, FILLET2_R), (-FILLET2_R * 0.02, -FILLET2_R * 0.02))
            Line((-FILLET2_R * 0.02, -FILLET2_R * 0.02), (FILLET2_R, -FILLET2_R * 0.02))
            Line((FILLET2_R, -FILLET2_R * 0.02), (FILLET2_R, 0))
        make_face()
    fillet2_piece_22a = extrude(amount=15.5, mode=Mode.PRIVATE)
    fillet2_piece_22a = split(fillet2_piece_22a, bisect_by=Plane(origin=(14, 3.773604886, -23.226395114), z_dir=(1, 0, 0)), keep=Keep.TOP, mode=Mode.PRIVATE)
    with BuildSketch(Plane(origin=(14, 4, -25.5), x_dir=(0, -1, 0), z_dir=(0, 0, 1))) as fillet2_piece_22b_section:
        with BuildLine():
            CenterArc((FILLET2_R, FILLET2_R), FILLET2_R, 180, 90)
            Line((0, FILLET2_R), (-FILLET2_R * 0.02, FILLET2_R))
            Line((-FILLET2_R * 0.02, FILLET2_R), (-FILLET2_R * 0.02, -FILLET2_R * 0.02))
            Line((-FILLET2_R * 0.02, -FILLET2_R * 0.02), (FILLET2_R, -FILLET2_R * 0.02))
            Line((FILLET2_R, -FILLET2_R * 0.02), (FILLET2_R, 0))
        make_face()
    fillet2_piece_22b = extrude(amount=3.563508327, mode=Mode.PRIVATE)
    fillet2_piece_22b = split(fillet2_piece_22b, bisect_by=Plane(origin=(14.226395114, 3.773604886, -23), z_dir=(0, 0, -1)), keep=Keep.TOP, mode=Mode.PRIVATE)
    fillet2_piece_22 = fillet2_piece_22a & fillet2_piece_22b
    add(fillet2_piece_22, mode=Mode.SUBTRACT)


solid = part.part
